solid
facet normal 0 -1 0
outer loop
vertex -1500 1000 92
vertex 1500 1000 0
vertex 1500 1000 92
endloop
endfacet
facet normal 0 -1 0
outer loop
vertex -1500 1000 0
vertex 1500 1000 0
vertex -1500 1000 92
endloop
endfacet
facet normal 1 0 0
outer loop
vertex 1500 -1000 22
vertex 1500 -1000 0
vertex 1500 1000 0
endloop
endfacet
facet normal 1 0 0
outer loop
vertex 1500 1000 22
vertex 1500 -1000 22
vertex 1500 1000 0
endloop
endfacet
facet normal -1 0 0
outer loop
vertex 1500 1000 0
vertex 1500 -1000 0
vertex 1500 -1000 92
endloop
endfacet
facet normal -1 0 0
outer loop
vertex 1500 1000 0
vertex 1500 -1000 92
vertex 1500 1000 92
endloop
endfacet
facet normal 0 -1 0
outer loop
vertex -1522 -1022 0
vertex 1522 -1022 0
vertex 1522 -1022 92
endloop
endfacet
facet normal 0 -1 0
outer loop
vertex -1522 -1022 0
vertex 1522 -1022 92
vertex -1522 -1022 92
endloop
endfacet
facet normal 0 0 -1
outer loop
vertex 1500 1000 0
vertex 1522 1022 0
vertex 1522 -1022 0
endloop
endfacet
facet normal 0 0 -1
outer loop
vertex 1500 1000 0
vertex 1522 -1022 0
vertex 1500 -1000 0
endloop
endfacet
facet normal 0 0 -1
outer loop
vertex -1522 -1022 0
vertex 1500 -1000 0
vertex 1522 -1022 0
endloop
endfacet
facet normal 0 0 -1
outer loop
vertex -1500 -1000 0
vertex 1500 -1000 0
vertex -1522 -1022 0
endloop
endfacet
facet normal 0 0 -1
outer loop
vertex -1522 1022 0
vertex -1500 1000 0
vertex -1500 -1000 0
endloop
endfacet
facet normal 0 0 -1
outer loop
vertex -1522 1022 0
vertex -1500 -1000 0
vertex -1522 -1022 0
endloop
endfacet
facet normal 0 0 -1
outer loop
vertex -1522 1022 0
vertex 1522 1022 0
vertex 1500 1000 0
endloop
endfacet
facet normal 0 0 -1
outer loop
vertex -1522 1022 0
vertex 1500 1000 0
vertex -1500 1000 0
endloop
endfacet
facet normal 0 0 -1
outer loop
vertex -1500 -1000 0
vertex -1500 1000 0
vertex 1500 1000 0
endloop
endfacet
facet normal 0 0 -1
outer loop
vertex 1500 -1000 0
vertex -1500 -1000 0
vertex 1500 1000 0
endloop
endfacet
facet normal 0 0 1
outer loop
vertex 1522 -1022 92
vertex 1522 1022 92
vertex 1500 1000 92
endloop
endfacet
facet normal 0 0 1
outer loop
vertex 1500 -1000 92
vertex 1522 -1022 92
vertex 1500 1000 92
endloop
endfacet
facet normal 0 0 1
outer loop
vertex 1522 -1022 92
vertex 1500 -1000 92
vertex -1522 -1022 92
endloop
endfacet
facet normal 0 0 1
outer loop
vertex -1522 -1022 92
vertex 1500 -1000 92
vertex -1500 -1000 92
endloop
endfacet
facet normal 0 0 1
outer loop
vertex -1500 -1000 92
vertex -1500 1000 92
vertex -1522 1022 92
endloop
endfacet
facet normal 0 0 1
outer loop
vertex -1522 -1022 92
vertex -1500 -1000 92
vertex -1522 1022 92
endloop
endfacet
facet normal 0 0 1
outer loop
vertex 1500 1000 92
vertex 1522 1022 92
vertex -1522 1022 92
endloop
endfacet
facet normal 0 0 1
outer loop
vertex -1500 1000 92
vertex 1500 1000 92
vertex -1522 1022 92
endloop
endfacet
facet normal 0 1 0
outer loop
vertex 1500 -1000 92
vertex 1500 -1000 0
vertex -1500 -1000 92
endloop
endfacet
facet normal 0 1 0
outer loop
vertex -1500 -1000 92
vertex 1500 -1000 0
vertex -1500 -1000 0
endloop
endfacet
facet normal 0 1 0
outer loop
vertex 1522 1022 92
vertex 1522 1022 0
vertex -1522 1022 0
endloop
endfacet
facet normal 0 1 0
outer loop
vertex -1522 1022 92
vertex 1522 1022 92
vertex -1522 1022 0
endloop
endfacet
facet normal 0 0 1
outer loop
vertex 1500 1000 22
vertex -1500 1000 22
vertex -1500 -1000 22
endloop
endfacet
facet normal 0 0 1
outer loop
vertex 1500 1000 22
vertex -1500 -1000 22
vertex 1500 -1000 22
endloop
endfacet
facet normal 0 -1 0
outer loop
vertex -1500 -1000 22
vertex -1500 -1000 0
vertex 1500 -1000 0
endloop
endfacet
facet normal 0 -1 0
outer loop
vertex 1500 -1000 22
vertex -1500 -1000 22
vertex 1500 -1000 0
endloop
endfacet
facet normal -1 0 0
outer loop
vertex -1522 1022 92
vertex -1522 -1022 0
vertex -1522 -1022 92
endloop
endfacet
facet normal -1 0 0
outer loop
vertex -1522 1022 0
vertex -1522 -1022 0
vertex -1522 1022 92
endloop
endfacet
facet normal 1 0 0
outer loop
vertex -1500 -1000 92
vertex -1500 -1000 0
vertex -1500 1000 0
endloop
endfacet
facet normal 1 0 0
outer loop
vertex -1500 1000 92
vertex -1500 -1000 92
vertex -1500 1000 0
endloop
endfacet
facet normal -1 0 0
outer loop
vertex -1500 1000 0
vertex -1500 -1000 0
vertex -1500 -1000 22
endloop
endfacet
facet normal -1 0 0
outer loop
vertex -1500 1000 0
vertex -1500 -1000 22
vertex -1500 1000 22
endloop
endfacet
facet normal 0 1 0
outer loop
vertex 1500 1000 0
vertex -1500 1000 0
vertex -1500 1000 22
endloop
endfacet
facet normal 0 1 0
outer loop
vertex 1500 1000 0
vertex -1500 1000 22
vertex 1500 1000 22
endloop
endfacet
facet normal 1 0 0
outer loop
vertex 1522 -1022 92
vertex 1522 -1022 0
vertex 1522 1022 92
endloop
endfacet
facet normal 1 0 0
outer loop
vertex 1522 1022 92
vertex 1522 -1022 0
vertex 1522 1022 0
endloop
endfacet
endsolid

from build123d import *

# Parameters (mm, degrees)
ESQUISSE1_W   = 3000
ESQUISSE1_H   = 2000
BOTTOM_DEPTH  = 22
ESQUISSE2_W   = 3044
ESQUISSE2_H   = 2044
ESQUISSE2_W_2 = 3000
ESQUISSE2_H_2 = 2000
BORDER_DEPTH  = 92


with BuildPart() as part:
    # Esquisse1 → Bottom (new body)
    with BuildSketch(Plane.XY):
        Rectangle(ESQUISSE1_W, ESQUISSE1_H)
    extrude(amount=BOTTOM_DEPTH)


with BuildPart() as body_2:
    # Esquisse2 → Border (new body)
    with BuildSketch(Plane(origin=(0, 0, 0), x_dir=(-1, 0, 0), z_dir=(0, 0, -1))):
        Rectangle(ESQUISSE2_W, ESQUISSE2_H)
        Rectangle(ESQUISSE2_W_2, ESQUISSE2_H_2, mode=Mode.SUBTRACT)
    extrude(amount=-BORDER_DEPTH)


solid = Compound([part.part, body_2.part])
